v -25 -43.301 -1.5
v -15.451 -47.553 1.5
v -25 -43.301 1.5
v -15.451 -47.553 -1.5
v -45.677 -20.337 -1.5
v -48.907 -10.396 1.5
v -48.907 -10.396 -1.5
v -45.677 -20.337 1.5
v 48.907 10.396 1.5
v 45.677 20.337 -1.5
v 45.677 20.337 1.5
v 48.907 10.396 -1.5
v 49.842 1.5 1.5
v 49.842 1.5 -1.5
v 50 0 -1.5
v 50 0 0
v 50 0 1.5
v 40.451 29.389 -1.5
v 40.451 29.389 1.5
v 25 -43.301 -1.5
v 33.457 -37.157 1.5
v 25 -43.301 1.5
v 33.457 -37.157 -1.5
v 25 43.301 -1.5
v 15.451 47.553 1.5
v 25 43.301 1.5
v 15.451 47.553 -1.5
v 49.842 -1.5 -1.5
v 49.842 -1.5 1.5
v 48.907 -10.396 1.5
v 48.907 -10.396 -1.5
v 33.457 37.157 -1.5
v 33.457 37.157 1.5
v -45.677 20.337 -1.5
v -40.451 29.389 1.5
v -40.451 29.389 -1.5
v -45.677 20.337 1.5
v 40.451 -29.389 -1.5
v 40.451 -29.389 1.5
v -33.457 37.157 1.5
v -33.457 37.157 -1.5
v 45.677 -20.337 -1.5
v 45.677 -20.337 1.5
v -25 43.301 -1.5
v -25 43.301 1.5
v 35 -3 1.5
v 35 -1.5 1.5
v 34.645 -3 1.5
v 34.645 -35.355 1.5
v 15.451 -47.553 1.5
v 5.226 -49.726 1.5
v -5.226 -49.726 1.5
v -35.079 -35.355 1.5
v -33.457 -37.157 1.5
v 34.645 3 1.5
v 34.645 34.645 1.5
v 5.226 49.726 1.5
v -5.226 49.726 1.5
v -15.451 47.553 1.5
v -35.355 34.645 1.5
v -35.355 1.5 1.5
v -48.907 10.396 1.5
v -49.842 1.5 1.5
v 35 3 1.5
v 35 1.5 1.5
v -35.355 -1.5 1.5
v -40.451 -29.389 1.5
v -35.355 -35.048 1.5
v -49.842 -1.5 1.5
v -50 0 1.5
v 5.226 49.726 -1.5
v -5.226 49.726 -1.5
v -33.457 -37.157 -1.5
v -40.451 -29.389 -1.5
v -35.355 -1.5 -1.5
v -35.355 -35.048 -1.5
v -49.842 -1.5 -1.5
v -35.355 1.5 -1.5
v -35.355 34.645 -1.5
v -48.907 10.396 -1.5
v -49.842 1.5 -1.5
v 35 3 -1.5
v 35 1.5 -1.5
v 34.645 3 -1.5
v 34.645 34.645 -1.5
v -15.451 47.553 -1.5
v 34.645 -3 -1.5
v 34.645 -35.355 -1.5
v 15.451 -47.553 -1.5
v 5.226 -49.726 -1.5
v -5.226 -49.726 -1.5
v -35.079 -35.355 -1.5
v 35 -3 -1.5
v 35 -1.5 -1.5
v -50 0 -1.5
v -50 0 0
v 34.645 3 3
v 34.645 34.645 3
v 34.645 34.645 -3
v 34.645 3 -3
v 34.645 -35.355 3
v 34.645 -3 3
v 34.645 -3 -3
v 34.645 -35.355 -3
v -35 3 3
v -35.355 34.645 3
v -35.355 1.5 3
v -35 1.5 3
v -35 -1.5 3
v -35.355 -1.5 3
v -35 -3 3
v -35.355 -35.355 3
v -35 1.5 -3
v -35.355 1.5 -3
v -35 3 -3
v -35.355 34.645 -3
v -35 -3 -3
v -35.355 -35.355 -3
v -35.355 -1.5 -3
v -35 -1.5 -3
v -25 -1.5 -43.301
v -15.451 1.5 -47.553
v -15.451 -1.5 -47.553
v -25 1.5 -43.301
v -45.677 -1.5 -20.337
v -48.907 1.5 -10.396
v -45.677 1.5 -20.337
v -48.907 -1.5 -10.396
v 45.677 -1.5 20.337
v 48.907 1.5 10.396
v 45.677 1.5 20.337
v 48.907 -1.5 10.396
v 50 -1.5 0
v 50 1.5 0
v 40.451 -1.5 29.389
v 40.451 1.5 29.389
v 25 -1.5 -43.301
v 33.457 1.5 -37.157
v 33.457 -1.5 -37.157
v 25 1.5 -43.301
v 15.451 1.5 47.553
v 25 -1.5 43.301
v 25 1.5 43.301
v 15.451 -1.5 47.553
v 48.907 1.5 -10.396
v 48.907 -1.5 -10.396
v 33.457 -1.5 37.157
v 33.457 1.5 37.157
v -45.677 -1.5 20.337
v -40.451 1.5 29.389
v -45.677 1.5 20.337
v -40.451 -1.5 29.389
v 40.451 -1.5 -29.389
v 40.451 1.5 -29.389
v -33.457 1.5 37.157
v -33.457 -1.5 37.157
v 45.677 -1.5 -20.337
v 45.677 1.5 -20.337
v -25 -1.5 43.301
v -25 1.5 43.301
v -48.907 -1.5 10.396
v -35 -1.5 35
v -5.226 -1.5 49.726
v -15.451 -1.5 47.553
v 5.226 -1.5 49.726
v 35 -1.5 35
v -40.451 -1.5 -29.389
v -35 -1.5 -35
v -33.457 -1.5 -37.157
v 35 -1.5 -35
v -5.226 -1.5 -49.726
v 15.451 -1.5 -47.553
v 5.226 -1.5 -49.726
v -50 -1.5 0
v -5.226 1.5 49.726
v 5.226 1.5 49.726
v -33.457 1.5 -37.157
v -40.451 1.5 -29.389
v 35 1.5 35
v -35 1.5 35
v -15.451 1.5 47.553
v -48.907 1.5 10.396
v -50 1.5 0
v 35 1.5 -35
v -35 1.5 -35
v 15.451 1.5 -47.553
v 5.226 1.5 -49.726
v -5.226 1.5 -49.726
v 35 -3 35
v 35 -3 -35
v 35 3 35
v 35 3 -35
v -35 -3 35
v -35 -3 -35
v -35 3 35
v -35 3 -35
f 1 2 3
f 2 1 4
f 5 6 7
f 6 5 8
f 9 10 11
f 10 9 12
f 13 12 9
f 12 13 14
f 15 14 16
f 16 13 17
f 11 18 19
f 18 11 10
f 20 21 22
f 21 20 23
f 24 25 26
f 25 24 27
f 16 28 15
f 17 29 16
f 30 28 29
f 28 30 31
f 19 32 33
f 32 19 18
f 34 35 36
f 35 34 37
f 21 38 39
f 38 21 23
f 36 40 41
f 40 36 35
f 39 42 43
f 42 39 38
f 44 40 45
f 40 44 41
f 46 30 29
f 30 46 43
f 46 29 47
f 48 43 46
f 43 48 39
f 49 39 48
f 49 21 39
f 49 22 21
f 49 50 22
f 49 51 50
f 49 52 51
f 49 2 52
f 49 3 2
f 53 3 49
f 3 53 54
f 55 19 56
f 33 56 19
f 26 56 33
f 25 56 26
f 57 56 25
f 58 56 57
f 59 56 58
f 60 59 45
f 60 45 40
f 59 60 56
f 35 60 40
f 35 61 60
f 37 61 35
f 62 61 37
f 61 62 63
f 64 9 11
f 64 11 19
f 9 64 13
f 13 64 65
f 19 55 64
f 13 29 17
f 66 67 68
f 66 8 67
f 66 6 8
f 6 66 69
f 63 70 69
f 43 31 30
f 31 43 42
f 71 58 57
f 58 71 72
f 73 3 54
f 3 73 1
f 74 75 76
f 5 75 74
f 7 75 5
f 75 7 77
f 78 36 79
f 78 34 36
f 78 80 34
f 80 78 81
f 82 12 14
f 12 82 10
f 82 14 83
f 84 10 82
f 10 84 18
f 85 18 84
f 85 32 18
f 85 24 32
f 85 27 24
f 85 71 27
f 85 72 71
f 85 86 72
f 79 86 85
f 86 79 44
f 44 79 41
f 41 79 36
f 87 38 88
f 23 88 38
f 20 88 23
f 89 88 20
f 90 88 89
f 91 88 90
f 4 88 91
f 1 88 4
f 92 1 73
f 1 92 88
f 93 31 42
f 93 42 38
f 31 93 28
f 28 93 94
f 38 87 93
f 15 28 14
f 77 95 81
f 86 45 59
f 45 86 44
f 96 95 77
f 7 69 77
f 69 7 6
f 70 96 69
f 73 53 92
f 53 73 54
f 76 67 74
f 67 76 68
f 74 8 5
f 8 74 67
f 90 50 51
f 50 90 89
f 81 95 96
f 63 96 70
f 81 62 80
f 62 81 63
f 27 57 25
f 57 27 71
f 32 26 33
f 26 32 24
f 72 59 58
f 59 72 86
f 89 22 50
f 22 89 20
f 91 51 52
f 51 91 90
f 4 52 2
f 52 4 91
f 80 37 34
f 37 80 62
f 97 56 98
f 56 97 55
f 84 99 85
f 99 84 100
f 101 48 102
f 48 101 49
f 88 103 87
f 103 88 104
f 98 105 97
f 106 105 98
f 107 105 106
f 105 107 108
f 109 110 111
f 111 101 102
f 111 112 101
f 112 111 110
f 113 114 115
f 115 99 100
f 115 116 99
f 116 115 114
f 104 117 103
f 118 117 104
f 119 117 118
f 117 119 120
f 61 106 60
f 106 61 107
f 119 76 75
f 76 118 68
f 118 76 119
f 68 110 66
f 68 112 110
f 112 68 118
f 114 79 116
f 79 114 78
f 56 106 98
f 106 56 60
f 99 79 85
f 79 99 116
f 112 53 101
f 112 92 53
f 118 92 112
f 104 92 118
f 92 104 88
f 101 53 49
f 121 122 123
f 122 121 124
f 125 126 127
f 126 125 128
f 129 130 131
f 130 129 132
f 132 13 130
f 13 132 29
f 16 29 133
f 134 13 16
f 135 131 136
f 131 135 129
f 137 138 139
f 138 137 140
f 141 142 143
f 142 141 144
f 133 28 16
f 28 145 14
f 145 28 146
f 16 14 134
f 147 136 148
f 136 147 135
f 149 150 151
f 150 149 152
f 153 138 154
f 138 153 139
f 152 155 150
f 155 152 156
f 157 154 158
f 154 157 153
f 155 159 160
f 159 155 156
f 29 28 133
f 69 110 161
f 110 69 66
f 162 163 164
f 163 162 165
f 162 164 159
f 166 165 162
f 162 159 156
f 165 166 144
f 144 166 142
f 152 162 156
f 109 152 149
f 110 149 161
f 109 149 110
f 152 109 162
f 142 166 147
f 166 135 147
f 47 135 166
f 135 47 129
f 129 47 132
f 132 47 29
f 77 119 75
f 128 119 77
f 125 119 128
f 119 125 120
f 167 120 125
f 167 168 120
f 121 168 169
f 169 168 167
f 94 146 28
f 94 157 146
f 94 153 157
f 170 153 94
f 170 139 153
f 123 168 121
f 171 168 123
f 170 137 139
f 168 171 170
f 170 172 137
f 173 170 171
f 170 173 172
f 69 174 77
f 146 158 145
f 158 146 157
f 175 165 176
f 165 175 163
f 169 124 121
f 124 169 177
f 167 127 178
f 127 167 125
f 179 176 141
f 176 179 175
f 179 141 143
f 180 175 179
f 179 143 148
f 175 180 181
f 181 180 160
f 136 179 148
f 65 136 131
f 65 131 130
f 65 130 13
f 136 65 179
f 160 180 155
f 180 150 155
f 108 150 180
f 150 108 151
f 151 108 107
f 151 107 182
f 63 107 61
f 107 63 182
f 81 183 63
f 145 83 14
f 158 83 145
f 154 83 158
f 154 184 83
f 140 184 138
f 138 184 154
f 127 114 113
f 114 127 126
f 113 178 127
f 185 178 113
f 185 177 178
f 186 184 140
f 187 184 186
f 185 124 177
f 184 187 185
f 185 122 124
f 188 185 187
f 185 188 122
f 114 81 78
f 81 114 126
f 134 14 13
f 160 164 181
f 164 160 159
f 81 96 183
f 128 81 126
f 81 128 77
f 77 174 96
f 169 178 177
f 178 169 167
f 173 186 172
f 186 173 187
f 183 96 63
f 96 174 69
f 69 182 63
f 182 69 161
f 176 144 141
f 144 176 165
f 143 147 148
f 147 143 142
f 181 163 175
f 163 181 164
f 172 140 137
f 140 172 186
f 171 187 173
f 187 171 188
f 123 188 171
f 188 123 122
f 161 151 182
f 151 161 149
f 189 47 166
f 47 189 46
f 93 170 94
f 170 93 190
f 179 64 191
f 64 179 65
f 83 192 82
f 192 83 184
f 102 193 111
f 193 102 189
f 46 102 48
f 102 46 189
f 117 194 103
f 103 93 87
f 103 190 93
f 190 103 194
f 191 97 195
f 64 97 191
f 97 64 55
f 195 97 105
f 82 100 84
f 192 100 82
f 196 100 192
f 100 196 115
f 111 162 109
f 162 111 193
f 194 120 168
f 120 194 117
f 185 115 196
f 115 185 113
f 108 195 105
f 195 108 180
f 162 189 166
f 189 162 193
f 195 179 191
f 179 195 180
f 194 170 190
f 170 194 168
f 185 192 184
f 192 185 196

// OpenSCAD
radius = 50;
size = 2 * radius * cos(45);
thickness = 3;

WhatsIt();
WhatsItCentered();

module WhatsIt() {
	translate([0, 0, -thickness / 2]) cylinder(r = 50, h = thickness);
	translate([-size / 2, -size / 2, -thickness]) cube([70, 70, thickness * 2]);
}

module WhatsItCentered() {
	rotate([90, 0, 0])  {
		cylinder(r = 50, h = thickness, center = true);
		cube([70, 70, thickness * 2], center = true);
	}
}
